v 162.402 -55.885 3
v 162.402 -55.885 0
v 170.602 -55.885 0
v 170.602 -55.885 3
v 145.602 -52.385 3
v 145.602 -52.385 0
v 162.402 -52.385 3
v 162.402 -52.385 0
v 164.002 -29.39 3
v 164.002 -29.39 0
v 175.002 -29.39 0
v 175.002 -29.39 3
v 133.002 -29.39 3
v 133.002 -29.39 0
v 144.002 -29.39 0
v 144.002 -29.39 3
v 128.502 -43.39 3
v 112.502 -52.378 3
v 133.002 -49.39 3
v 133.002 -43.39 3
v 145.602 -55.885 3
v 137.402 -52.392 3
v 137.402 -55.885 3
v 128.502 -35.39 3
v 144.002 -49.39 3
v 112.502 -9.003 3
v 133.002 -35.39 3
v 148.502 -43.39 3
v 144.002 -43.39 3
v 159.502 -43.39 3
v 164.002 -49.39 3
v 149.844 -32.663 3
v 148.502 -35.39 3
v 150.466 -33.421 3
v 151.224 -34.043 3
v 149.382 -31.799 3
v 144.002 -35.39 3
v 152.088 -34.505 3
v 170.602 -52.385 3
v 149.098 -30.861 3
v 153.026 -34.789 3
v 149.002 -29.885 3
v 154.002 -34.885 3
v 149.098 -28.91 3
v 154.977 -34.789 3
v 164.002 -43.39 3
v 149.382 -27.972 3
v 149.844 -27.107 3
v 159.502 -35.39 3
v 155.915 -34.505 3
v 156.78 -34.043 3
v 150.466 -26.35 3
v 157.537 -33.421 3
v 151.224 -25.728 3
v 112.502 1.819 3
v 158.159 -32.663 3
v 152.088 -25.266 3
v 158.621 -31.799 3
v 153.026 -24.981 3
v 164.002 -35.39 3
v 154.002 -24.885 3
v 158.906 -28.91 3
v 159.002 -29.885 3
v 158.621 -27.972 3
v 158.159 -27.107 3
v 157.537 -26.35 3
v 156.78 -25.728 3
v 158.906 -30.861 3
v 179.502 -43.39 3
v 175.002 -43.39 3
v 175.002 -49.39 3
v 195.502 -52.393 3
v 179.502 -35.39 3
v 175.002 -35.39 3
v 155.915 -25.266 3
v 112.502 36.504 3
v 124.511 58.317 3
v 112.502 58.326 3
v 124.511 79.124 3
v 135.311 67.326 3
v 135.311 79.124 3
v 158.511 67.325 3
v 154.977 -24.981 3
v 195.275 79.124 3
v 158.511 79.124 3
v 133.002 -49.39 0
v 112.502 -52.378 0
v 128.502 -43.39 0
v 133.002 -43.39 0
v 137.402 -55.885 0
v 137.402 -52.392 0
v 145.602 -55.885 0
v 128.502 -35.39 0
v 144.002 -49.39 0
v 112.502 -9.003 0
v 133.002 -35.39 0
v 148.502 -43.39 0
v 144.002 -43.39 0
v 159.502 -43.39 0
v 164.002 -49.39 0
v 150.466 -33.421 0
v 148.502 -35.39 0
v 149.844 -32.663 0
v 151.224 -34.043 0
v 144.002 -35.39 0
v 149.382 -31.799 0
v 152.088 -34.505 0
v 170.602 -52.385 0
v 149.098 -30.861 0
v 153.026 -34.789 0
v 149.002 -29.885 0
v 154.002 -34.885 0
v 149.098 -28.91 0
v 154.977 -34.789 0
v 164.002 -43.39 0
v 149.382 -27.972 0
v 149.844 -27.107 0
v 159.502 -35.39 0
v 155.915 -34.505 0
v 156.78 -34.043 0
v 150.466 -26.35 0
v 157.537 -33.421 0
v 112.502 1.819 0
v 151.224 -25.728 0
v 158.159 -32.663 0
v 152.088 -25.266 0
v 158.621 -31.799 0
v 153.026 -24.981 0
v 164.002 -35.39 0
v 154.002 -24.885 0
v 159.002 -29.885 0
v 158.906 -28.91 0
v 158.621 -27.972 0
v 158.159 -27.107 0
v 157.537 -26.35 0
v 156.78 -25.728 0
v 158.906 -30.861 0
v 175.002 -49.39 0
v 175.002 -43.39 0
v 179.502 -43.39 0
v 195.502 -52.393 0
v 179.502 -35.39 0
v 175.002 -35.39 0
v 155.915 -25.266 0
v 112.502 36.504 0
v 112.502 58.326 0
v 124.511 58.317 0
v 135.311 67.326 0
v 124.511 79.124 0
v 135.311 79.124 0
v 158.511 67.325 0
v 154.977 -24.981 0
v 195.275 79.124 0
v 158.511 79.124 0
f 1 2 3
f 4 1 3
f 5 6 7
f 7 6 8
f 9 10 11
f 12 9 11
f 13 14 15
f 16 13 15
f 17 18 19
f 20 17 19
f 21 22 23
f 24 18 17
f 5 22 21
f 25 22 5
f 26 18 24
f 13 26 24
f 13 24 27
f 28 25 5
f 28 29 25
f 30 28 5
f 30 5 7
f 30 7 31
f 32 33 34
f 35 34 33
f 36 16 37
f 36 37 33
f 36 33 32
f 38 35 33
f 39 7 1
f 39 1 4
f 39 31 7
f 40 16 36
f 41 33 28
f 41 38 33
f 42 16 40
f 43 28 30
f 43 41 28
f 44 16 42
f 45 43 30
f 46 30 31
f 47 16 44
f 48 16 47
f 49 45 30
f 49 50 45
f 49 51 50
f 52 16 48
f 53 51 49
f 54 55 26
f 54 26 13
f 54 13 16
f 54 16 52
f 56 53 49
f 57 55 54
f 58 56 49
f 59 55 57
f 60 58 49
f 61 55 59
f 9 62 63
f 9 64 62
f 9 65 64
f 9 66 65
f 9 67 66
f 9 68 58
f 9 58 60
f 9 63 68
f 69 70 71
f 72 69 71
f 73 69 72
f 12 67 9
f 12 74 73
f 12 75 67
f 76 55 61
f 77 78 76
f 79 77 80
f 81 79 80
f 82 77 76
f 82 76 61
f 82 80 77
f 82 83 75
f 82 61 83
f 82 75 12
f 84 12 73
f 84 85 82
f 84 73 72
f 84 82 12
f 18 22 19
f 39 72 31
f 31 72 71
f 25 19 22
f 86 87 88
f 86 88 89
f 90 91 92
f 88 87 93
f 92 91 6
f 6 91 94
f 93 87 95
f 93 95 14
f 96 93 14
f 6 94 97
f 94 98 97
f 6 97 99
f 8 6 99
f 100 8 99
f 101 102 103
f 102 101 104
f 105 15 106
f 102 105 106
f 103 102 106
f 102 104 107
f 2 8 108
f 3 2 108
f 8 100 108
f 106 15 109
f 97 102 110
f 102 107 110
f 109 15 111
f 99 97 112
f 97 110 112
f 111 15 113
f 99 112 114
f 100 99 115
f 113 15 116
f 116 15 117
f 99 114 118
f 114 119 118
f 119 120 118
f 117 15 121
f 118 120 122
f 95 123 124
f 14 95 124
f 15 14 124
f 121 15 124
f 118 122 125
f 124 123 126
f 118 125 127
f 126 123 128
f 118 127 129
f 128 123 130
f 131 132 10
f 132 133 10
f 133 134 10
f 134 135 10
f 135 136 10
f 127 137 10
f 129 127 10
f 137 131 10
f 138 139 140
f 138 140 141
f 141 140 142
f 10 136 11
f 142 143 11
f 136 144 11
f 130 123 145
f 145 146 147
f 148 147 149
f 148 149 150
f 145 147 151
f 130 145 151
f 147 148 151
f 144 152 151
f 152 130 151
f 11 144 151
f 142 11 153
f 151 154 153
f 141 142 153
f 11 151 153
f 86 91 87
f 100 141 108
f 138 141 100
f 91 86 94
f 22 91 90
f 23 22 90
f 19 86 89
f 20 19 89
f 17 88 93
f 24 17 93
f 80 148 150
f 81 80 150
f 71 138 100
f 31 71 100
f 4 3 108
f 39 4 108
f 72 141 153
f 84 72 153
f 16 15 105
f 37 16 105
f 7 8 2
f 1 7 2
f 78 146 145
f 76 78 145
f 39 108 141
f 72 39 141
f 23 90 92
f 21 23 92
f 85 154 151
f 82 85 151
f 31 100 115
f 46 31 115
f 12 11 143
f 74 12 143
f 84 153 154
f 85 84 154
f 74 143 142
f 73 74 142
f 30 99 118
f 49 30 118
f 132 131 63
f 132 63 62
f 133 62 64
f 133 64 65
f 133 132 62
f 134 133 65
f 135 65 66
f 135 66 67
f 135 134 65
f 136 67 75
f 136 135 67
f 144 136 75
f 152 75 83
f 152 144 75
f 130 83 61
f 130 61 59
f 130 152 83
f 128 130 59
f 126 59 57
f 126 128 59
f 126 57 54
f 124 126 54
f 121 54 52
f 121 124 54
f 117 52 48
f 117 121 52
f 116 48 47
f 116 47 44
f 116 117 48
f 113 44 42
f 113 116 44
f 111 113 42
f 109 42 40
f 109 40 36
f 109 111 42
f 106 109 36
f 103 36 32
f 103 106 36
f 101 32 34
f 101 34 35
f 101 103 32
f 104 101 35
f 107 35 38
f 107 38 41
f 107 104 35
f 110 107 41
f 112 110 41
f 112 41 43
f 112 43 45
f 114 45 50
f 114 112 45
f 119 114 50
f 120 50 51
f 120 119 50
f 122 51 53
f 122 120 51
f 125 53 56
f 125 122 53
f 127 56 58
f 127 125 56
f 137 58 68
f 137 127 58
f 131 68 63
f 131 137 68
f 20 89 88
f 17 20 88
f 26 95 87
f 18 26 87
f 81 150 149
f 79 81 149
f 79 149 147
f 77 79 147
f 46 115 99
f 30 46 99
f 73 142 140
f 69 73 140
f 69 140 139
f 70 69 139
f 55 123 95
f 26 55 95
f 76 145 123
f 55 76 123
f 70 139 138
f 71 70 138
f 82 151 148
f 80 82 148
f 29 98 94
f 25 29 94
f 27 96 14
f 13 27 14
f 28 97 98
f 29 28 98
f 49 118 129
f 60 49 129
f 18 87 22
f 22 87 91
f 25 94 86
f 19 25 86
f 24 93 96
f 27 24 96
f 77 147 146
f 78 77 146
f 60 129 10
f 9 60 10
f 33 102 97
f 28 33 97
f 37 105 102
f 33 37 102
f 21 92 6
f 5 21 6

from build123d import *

# Parameters (mm, degrees)
MODEL_R                 = 5
SALIENTE_EXTRUIR1_DEPTH = 3


with BuildPart() as part:
    # Model → Saliente-Extruir1 (new body)
    with BuildSketch(Plane.XY):
        Polygon((124.511184003, 58.317312114), (112.50181664, 58.326235146), (112.501811813, 36.503581249), (112.501804141, 1.819115993), (112.501801747, -9.003305006), (112.501792152, -52.377623741), (137.401805699, -52.391743595), (137.401805699, -55.885276943), (145.601805699, -55.885276943), (145.601805699, -52.385276943), (162.401805699, -52.385276943), (162.401805699, -55.885276943), (170.601805699, -55.885276943), (170.601805699, -52.385276943), (195.501819246, -52.392930144), (195.275424073, 79.124358077), (158.510749751, 79.124374738), (158.510749751, 67.325142582), (135.310749751, 67.32643696), (135.310749751, 79.124374745), (124.511184003, 79.124374745), align=None)
        Polygon((144.00179591, -43.389548344), (144.00179591, -49.389548344), (133.00179591, -49.389548344), (133.00179591, -43.389548344), (128.50179591, -43.389548344), (128.50179591, -35.389548344), (133.00179591, -35.389548344), (133.00179591, -29.389548344), (144.00179591, -29.389548344), (144.00179591, -35.389548344), (148.50179591, -35.389548344), (148.50179591, -43.389548344), align=None, mode=Mode.SUBTRACT)
        with Locations((154.001805699, -29.885276943)):
            Circle(MODEL_R, mode=Mode.SUBTRACT)
        Polygon((175.001819246, -43.389558962), (175.001819246, -49.389558962), (164.001819246, -49.389558962), (164.001819246, -43.389558962), (159.501819246, -43.389558962), (159.501819246, -35.389558962), (164.001819246, -35.389558962), (164.001819246, -29.389558962), (175.001819246, -29.389558962), (175.001819246, -35.389558962), (179.501819246, -35.389558962), (179.501819246, -43.389558962), align=None, mode=Mode.SUBTRACT)
    extrude(amount=SALIENTE_EXTRUIR1_DEPTH)


solid = part.part
